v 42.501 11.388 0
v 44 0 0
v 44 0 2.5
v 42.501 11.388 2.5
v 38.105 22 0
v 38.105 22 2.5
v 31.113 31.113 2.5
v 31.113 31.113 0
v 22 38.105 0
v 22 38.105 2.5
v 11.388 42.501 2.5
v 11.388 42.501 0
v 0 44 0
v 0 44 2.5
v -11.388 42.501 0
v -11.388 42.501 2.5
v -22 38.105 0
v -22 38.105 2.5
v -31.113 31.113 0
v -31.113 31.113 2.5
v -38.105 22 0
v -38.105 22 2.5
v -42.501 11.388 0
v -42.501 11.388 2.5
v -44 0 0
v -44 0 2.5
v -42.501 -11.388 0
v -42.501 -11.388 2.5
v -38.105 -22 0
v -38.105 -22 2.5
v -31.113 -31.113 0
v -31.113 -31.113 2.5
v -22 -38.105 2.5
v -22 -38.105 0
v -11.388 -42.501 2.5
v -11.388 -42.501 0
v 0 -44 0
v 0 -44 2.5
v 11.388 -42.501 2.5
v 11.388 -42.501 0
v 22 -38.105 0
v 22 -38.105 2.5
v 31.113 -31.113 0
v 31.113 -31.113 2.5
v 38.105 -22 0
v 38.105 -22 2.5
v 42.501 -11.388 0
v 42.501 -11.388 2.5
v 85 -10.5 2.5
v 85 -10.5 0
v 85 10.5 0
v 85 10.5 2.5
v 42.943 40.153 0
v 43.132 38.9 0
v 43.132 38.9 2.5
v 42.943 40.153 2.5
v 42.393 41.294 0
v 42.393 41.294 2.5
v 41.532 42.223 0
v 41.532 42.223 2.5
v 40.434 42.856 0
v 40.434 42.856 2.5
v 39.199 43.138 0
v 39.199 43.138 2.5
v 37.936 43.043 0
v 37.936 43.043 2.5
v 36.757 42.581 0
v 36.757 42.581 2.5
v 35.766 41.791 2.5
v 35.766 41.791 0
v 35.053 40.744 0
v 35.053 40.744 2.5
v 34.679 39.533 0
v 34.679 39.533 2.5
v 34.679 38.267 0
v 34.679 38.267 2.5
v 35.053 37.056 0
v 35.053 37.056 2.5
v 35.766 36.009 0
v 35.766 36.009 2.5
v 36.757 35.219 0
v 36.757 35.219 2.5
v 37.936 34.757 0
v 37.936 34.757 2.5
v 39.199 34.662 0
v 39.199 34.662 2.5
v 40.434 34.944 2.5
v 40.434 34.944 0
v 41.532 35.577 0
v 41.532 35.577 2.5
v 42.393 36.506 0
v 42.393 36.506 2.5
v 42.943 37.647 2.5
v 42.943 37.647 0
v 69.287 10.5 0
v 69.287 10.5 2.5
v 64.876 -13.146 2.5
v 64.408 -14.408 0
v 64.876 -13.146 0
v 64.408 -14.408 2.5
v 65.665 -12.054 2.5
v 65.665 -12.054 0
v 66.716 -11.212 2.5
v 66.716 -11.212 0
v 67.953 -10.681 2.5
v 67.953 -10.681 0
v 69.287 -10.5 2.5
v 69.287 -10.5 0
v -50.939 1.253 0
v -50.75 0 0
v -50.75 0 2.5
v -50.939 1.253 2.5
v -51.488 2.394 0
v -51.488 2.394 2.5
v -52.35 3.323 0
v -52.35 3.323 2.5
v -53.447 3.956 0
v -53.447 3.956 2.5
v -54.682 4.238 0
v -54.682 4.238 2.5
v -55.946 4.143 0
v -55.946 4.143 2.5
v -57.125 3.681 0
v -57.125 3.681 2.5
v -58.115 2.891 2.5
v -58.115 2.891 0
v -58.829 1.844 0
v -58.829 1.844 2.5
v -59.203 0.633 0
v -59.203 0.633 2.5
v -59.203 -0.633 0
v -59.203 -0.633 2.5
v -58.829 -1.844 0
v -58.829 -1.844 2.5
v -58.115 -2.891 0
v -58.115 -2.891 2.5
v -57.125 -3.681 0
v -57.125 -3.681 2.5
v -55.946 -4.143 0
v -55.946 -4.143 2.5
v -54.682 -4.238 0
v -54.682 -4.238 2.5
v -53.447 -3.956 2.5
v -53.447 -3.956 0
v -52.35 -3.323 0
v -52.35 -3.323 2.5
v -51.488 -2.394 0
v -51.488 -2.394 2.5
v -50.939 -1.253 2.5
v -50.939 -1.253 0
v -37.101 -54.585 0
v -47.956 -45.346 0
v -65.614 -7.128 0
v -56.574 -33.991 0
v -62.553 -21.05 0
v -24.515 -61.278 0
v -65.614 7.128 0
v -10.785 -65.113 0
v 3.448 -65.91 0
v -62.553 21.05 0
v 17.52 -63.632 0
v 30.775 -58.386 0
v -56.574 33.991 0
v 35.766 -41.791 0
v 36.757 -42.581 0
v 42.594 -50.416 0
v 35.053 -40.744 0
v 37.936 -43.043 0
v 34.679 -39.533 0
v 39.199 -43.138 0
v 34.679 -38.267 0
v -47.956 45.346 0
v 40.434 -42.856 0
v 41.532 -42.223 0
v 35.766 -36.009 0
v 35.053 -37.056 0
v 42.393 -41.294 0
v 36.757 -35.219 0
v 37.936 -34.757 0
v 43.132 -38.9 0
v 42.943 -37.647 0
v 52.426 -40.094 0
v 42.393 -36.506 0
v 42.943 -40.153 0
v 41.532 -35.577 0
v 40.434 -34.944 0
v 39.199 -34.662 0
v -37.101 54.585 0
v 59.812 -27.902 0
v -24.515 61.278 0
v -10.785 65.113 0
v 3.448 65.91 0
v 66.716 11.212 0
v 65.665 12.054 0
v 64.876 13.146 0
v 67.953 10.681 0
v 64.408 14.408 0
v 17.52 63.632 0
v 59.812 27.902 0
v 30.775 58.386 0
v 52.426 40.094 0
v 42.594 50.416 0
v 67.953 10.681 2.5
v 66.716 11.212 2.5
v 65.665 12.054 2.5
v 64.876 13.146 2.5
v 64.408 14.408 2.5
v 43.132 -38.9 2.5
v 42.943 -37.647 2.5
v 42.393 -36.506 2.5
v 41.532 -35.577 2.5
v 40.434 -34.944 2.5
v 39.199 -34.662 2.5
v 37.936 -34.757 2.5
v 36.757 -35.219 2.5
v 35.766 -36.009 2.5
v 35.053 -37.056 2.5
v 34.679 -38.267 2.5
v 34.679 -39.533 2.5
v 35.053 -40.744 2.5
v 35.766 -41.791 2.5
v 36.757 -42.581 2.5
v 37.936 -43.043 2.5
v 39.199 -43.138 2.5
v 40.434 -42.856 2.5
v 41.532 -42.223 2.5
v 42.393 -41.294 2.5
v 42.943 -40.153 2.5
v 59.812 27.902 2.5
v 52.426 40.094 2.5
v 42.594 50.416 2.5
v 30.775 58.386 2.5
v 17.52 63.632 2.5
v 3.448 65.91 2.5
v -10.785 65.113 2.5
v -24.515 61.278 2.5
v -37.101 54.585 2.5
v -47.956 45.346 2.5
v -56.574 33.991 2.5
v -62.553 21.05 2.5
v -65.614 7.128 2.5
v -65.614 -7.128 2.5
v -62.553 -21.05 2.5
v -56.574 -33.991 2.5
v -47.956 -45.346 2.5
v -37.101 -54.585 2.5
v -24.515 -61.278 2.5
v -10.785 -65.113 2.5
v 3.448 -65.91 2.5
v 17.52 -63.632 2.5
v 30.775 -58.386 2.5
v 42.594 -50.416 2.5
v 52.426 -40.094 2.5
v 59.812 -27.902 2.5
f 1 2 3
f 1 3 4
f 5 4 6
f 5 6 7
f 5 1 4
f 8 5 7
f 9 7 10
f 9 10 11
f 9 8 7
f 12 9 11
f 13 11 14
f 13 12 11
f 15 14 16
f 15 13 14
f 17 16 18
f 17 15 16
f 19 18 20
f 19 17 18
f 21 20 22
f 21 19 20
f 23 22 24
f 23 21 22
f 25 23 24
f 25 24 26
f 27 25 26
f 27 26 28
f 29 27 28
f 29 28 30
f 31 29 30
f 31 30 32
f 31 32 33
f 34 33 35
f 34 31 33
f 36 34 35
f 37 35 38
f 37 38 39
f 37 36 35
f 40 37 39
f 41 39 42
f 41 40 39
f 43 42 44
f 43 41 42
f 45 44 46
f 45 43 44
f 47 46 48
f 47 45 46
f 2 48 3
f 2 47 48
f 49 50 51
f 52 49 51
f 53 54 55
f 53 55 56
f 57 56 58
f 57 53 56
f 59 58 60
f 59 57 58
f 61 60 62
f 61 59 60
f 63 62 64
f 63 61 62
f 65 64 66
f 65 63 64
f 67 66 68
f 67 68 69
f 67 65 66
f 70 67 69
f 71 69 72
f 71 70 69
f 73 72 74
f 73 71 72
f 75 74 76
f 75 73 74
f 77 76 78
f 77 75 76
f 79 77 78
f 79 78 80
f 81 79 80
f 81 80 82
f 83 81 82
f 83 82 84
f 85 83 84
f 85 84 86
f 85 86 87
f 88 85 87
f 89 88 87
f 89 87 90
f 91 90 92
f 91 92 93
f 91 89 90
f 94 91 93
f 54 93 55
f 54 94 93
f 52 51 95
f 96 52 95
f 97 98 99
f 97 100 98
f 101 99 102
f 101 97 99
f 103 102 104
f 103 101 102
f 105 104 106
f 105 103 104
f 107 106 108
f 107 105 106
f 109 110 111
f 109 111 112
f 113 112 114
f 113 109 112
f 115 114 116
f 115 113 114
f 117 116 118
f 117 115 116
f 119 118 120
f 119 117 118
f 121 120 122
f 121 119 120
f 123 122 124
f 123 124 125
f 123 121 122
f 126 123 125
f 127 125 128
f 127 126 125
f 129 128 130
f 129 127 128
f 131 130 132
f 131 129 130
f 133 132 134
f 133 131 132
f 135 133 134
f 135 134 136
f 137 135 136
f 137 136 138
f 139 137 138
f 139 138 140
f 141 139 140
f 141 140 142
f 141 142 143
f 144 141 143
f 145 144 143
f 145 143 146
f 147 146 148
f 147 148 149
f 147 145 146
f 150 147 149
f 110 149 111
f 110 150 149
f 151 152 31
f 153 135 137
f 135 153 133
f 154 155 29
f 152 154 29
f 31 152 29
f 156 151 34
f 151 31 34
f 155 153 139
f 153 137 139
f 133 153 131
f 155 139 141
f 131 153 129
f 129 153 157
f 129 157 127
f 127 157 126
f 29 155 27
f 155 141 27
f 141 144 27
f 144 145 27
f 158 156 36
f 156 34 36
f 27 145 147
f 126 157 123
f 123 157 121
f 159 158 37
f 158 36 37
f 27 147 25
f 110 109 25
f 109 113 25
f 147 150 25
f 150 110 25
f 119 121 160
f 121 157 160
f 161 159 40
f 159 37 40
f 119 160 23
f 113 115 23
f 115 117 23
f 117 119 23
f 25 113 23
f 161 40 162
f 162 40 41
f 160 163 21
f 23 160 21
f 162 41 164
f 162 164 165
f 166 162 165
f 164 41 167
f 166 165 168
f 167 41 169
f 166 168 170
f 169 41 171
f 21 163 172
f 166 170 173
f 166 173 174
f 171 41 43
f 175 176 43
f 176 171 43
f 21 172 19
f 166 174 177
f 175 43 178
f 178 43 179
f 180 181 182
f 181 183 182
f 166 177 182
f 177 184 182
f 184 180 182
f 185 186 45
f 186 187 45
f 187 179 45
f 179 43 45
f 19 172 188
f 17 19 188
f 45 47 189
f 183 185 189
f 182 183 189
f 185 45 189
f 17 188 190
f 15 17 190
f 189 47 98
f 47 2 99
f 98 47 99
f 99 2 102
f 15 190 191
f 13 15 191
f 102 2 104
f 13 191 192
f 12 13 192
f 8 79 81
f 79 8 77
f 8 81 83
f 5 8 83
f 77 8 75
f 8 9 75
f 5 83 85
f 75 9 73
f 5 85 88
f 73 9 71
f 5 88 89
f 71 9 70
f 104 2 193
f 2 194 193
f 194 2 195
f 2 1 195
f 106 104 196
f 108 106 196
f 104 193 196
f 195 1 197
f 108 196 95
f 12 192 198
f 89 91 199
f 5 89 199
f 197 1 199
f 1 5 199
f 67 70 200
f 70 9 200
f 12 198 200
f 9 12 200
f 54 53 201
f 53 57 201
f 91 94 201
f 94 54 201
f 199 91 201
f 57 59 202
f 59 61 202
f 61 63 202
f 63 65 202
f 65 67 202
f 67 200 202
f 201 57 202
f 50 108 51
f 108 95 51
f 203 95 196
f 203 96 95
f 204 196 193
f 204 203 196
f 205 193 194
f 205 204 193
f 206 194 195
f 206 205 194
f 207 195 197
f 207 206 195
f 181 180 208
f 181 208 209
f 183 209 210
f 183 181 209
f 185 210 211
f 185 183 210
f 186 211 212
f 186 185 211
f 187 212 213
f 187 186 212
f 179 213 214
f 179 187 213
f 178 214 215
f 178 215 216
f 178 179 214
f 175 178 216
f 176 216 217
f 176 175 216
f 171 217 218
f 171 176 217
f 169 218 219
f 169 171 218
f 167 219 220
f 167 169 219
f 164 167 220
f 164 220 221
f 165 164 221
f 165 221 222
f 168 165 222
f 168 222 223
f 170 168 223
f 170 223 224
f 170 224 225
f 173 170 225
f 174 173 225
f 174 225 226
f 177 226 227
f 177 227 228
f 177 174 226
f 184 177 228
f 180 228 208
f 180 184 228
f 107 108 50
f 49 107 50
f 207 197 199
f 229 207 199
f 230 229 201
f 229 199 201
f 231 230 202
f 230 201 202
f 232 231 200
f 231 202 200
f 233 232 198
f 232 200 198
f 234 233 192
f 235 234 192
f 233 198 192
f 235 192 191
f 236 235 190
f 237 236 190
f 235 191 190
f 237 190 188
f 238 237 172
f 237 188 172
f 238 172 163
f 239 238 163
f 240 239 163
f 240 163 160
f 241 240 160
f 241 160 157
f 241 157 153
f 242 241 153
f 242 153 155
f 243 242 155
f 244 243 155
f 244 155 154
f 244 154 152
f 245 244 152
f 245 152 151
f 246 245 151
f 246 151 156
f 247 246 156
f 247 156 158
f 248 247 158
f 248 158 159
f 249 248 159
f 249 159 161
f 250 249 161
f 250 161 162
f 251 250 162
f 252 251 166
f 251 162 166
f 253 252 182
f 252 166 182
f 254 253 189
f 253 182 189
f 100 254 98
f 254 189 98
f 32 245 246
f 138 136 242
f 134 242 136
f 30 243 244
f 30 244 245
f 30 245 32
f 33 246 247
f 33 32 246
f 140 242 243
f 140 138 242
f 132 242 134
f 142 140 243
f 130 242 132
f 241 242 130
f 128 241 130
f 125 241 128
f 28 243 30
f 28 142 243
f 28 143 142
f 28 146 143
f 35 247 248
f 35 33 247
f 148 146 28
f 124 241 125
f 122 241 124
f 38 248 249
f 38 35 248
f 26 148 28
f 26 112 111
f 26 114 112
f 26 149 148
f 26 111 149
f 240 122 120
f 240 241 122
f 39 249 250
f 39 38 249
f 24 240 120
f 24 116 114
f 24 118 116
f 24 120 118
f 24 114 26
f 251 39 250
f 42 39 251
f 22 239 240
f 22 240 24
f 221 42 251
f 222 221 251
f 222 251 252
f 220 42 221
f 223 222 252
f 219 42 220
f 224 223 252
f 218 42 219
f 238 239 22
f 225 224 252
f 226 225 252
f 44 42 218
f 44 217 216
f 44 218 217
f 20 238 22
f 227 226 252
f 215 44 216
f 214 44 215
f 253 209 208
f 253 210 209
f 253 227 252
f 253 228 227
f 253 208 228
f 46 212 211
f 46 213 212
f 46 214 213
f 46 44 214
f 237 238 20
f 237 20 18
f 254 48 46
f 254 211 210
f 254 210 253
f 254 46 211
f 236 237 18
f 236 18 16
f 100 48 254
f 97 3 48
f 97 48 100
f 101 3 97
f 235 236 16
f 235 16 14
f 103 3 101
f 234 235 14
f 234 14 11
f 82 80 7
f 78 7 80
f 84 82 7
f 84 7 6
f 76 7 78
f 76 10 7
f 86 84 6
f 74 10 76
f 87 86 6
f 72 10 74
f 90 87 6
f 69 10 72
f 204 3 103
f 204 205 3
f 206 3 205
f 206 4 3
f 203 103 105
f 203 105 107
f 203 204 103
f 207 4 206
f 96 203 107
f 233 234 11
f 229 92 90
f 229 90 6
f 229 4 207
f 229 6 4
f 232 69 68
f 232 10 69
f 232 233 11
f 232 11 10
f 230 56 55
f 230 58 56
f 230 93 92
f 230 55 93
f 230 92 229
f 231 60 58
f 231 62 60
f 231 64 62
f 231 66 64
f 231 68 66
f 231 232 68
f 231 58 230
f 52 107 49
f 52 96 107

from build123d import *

# Parameters (mm, degrees)
F0_R     = 4.25
F0_R_2   = 44
F1_DEPTH = 2.5
F2_R     = 5


with BuildPart() as f1:
    # F0 (on Top) → F1 (new body)
    with BuildSketch(Plane.XY):
        with BuildLine():
            Line((85, 10.5), (65.1594198869, 10.5))
            ThreePointArc((65.1594198869, 10.5), (-66, 0), (65.1594198869, -10.5))
            Line((65.1594198869, -10.5), (85, -10.5))
            Line((85, -10.5), (85, 10.5))
        make_face()
        with Locations((38.8817437881, -38.9)):
            Circle(F0_R, mode=Mode.SUBTRACT)
        with Locations((-55, 0)):
            Circle(F0_R, mode=Mode.SUBTRACT)
        Circle(F0_R_2, mode=Mode.SUBTRACT)
        with Locations((38.8817437881, 38.9)):
            Circle(F0_R, mode=Mode.SUBTRACT)
    extrude(amount=F1_DEPTH)

    # F2
    f2_edges = [f1.edges().sort_by_distance(p)[0] for p in [
        (65.15942, 10.5, 1.25),
        (65.15942, -10.5, 1.25),
    ]]
    fillet(f2_edges, radius=F2_R)


solid = f1.part
